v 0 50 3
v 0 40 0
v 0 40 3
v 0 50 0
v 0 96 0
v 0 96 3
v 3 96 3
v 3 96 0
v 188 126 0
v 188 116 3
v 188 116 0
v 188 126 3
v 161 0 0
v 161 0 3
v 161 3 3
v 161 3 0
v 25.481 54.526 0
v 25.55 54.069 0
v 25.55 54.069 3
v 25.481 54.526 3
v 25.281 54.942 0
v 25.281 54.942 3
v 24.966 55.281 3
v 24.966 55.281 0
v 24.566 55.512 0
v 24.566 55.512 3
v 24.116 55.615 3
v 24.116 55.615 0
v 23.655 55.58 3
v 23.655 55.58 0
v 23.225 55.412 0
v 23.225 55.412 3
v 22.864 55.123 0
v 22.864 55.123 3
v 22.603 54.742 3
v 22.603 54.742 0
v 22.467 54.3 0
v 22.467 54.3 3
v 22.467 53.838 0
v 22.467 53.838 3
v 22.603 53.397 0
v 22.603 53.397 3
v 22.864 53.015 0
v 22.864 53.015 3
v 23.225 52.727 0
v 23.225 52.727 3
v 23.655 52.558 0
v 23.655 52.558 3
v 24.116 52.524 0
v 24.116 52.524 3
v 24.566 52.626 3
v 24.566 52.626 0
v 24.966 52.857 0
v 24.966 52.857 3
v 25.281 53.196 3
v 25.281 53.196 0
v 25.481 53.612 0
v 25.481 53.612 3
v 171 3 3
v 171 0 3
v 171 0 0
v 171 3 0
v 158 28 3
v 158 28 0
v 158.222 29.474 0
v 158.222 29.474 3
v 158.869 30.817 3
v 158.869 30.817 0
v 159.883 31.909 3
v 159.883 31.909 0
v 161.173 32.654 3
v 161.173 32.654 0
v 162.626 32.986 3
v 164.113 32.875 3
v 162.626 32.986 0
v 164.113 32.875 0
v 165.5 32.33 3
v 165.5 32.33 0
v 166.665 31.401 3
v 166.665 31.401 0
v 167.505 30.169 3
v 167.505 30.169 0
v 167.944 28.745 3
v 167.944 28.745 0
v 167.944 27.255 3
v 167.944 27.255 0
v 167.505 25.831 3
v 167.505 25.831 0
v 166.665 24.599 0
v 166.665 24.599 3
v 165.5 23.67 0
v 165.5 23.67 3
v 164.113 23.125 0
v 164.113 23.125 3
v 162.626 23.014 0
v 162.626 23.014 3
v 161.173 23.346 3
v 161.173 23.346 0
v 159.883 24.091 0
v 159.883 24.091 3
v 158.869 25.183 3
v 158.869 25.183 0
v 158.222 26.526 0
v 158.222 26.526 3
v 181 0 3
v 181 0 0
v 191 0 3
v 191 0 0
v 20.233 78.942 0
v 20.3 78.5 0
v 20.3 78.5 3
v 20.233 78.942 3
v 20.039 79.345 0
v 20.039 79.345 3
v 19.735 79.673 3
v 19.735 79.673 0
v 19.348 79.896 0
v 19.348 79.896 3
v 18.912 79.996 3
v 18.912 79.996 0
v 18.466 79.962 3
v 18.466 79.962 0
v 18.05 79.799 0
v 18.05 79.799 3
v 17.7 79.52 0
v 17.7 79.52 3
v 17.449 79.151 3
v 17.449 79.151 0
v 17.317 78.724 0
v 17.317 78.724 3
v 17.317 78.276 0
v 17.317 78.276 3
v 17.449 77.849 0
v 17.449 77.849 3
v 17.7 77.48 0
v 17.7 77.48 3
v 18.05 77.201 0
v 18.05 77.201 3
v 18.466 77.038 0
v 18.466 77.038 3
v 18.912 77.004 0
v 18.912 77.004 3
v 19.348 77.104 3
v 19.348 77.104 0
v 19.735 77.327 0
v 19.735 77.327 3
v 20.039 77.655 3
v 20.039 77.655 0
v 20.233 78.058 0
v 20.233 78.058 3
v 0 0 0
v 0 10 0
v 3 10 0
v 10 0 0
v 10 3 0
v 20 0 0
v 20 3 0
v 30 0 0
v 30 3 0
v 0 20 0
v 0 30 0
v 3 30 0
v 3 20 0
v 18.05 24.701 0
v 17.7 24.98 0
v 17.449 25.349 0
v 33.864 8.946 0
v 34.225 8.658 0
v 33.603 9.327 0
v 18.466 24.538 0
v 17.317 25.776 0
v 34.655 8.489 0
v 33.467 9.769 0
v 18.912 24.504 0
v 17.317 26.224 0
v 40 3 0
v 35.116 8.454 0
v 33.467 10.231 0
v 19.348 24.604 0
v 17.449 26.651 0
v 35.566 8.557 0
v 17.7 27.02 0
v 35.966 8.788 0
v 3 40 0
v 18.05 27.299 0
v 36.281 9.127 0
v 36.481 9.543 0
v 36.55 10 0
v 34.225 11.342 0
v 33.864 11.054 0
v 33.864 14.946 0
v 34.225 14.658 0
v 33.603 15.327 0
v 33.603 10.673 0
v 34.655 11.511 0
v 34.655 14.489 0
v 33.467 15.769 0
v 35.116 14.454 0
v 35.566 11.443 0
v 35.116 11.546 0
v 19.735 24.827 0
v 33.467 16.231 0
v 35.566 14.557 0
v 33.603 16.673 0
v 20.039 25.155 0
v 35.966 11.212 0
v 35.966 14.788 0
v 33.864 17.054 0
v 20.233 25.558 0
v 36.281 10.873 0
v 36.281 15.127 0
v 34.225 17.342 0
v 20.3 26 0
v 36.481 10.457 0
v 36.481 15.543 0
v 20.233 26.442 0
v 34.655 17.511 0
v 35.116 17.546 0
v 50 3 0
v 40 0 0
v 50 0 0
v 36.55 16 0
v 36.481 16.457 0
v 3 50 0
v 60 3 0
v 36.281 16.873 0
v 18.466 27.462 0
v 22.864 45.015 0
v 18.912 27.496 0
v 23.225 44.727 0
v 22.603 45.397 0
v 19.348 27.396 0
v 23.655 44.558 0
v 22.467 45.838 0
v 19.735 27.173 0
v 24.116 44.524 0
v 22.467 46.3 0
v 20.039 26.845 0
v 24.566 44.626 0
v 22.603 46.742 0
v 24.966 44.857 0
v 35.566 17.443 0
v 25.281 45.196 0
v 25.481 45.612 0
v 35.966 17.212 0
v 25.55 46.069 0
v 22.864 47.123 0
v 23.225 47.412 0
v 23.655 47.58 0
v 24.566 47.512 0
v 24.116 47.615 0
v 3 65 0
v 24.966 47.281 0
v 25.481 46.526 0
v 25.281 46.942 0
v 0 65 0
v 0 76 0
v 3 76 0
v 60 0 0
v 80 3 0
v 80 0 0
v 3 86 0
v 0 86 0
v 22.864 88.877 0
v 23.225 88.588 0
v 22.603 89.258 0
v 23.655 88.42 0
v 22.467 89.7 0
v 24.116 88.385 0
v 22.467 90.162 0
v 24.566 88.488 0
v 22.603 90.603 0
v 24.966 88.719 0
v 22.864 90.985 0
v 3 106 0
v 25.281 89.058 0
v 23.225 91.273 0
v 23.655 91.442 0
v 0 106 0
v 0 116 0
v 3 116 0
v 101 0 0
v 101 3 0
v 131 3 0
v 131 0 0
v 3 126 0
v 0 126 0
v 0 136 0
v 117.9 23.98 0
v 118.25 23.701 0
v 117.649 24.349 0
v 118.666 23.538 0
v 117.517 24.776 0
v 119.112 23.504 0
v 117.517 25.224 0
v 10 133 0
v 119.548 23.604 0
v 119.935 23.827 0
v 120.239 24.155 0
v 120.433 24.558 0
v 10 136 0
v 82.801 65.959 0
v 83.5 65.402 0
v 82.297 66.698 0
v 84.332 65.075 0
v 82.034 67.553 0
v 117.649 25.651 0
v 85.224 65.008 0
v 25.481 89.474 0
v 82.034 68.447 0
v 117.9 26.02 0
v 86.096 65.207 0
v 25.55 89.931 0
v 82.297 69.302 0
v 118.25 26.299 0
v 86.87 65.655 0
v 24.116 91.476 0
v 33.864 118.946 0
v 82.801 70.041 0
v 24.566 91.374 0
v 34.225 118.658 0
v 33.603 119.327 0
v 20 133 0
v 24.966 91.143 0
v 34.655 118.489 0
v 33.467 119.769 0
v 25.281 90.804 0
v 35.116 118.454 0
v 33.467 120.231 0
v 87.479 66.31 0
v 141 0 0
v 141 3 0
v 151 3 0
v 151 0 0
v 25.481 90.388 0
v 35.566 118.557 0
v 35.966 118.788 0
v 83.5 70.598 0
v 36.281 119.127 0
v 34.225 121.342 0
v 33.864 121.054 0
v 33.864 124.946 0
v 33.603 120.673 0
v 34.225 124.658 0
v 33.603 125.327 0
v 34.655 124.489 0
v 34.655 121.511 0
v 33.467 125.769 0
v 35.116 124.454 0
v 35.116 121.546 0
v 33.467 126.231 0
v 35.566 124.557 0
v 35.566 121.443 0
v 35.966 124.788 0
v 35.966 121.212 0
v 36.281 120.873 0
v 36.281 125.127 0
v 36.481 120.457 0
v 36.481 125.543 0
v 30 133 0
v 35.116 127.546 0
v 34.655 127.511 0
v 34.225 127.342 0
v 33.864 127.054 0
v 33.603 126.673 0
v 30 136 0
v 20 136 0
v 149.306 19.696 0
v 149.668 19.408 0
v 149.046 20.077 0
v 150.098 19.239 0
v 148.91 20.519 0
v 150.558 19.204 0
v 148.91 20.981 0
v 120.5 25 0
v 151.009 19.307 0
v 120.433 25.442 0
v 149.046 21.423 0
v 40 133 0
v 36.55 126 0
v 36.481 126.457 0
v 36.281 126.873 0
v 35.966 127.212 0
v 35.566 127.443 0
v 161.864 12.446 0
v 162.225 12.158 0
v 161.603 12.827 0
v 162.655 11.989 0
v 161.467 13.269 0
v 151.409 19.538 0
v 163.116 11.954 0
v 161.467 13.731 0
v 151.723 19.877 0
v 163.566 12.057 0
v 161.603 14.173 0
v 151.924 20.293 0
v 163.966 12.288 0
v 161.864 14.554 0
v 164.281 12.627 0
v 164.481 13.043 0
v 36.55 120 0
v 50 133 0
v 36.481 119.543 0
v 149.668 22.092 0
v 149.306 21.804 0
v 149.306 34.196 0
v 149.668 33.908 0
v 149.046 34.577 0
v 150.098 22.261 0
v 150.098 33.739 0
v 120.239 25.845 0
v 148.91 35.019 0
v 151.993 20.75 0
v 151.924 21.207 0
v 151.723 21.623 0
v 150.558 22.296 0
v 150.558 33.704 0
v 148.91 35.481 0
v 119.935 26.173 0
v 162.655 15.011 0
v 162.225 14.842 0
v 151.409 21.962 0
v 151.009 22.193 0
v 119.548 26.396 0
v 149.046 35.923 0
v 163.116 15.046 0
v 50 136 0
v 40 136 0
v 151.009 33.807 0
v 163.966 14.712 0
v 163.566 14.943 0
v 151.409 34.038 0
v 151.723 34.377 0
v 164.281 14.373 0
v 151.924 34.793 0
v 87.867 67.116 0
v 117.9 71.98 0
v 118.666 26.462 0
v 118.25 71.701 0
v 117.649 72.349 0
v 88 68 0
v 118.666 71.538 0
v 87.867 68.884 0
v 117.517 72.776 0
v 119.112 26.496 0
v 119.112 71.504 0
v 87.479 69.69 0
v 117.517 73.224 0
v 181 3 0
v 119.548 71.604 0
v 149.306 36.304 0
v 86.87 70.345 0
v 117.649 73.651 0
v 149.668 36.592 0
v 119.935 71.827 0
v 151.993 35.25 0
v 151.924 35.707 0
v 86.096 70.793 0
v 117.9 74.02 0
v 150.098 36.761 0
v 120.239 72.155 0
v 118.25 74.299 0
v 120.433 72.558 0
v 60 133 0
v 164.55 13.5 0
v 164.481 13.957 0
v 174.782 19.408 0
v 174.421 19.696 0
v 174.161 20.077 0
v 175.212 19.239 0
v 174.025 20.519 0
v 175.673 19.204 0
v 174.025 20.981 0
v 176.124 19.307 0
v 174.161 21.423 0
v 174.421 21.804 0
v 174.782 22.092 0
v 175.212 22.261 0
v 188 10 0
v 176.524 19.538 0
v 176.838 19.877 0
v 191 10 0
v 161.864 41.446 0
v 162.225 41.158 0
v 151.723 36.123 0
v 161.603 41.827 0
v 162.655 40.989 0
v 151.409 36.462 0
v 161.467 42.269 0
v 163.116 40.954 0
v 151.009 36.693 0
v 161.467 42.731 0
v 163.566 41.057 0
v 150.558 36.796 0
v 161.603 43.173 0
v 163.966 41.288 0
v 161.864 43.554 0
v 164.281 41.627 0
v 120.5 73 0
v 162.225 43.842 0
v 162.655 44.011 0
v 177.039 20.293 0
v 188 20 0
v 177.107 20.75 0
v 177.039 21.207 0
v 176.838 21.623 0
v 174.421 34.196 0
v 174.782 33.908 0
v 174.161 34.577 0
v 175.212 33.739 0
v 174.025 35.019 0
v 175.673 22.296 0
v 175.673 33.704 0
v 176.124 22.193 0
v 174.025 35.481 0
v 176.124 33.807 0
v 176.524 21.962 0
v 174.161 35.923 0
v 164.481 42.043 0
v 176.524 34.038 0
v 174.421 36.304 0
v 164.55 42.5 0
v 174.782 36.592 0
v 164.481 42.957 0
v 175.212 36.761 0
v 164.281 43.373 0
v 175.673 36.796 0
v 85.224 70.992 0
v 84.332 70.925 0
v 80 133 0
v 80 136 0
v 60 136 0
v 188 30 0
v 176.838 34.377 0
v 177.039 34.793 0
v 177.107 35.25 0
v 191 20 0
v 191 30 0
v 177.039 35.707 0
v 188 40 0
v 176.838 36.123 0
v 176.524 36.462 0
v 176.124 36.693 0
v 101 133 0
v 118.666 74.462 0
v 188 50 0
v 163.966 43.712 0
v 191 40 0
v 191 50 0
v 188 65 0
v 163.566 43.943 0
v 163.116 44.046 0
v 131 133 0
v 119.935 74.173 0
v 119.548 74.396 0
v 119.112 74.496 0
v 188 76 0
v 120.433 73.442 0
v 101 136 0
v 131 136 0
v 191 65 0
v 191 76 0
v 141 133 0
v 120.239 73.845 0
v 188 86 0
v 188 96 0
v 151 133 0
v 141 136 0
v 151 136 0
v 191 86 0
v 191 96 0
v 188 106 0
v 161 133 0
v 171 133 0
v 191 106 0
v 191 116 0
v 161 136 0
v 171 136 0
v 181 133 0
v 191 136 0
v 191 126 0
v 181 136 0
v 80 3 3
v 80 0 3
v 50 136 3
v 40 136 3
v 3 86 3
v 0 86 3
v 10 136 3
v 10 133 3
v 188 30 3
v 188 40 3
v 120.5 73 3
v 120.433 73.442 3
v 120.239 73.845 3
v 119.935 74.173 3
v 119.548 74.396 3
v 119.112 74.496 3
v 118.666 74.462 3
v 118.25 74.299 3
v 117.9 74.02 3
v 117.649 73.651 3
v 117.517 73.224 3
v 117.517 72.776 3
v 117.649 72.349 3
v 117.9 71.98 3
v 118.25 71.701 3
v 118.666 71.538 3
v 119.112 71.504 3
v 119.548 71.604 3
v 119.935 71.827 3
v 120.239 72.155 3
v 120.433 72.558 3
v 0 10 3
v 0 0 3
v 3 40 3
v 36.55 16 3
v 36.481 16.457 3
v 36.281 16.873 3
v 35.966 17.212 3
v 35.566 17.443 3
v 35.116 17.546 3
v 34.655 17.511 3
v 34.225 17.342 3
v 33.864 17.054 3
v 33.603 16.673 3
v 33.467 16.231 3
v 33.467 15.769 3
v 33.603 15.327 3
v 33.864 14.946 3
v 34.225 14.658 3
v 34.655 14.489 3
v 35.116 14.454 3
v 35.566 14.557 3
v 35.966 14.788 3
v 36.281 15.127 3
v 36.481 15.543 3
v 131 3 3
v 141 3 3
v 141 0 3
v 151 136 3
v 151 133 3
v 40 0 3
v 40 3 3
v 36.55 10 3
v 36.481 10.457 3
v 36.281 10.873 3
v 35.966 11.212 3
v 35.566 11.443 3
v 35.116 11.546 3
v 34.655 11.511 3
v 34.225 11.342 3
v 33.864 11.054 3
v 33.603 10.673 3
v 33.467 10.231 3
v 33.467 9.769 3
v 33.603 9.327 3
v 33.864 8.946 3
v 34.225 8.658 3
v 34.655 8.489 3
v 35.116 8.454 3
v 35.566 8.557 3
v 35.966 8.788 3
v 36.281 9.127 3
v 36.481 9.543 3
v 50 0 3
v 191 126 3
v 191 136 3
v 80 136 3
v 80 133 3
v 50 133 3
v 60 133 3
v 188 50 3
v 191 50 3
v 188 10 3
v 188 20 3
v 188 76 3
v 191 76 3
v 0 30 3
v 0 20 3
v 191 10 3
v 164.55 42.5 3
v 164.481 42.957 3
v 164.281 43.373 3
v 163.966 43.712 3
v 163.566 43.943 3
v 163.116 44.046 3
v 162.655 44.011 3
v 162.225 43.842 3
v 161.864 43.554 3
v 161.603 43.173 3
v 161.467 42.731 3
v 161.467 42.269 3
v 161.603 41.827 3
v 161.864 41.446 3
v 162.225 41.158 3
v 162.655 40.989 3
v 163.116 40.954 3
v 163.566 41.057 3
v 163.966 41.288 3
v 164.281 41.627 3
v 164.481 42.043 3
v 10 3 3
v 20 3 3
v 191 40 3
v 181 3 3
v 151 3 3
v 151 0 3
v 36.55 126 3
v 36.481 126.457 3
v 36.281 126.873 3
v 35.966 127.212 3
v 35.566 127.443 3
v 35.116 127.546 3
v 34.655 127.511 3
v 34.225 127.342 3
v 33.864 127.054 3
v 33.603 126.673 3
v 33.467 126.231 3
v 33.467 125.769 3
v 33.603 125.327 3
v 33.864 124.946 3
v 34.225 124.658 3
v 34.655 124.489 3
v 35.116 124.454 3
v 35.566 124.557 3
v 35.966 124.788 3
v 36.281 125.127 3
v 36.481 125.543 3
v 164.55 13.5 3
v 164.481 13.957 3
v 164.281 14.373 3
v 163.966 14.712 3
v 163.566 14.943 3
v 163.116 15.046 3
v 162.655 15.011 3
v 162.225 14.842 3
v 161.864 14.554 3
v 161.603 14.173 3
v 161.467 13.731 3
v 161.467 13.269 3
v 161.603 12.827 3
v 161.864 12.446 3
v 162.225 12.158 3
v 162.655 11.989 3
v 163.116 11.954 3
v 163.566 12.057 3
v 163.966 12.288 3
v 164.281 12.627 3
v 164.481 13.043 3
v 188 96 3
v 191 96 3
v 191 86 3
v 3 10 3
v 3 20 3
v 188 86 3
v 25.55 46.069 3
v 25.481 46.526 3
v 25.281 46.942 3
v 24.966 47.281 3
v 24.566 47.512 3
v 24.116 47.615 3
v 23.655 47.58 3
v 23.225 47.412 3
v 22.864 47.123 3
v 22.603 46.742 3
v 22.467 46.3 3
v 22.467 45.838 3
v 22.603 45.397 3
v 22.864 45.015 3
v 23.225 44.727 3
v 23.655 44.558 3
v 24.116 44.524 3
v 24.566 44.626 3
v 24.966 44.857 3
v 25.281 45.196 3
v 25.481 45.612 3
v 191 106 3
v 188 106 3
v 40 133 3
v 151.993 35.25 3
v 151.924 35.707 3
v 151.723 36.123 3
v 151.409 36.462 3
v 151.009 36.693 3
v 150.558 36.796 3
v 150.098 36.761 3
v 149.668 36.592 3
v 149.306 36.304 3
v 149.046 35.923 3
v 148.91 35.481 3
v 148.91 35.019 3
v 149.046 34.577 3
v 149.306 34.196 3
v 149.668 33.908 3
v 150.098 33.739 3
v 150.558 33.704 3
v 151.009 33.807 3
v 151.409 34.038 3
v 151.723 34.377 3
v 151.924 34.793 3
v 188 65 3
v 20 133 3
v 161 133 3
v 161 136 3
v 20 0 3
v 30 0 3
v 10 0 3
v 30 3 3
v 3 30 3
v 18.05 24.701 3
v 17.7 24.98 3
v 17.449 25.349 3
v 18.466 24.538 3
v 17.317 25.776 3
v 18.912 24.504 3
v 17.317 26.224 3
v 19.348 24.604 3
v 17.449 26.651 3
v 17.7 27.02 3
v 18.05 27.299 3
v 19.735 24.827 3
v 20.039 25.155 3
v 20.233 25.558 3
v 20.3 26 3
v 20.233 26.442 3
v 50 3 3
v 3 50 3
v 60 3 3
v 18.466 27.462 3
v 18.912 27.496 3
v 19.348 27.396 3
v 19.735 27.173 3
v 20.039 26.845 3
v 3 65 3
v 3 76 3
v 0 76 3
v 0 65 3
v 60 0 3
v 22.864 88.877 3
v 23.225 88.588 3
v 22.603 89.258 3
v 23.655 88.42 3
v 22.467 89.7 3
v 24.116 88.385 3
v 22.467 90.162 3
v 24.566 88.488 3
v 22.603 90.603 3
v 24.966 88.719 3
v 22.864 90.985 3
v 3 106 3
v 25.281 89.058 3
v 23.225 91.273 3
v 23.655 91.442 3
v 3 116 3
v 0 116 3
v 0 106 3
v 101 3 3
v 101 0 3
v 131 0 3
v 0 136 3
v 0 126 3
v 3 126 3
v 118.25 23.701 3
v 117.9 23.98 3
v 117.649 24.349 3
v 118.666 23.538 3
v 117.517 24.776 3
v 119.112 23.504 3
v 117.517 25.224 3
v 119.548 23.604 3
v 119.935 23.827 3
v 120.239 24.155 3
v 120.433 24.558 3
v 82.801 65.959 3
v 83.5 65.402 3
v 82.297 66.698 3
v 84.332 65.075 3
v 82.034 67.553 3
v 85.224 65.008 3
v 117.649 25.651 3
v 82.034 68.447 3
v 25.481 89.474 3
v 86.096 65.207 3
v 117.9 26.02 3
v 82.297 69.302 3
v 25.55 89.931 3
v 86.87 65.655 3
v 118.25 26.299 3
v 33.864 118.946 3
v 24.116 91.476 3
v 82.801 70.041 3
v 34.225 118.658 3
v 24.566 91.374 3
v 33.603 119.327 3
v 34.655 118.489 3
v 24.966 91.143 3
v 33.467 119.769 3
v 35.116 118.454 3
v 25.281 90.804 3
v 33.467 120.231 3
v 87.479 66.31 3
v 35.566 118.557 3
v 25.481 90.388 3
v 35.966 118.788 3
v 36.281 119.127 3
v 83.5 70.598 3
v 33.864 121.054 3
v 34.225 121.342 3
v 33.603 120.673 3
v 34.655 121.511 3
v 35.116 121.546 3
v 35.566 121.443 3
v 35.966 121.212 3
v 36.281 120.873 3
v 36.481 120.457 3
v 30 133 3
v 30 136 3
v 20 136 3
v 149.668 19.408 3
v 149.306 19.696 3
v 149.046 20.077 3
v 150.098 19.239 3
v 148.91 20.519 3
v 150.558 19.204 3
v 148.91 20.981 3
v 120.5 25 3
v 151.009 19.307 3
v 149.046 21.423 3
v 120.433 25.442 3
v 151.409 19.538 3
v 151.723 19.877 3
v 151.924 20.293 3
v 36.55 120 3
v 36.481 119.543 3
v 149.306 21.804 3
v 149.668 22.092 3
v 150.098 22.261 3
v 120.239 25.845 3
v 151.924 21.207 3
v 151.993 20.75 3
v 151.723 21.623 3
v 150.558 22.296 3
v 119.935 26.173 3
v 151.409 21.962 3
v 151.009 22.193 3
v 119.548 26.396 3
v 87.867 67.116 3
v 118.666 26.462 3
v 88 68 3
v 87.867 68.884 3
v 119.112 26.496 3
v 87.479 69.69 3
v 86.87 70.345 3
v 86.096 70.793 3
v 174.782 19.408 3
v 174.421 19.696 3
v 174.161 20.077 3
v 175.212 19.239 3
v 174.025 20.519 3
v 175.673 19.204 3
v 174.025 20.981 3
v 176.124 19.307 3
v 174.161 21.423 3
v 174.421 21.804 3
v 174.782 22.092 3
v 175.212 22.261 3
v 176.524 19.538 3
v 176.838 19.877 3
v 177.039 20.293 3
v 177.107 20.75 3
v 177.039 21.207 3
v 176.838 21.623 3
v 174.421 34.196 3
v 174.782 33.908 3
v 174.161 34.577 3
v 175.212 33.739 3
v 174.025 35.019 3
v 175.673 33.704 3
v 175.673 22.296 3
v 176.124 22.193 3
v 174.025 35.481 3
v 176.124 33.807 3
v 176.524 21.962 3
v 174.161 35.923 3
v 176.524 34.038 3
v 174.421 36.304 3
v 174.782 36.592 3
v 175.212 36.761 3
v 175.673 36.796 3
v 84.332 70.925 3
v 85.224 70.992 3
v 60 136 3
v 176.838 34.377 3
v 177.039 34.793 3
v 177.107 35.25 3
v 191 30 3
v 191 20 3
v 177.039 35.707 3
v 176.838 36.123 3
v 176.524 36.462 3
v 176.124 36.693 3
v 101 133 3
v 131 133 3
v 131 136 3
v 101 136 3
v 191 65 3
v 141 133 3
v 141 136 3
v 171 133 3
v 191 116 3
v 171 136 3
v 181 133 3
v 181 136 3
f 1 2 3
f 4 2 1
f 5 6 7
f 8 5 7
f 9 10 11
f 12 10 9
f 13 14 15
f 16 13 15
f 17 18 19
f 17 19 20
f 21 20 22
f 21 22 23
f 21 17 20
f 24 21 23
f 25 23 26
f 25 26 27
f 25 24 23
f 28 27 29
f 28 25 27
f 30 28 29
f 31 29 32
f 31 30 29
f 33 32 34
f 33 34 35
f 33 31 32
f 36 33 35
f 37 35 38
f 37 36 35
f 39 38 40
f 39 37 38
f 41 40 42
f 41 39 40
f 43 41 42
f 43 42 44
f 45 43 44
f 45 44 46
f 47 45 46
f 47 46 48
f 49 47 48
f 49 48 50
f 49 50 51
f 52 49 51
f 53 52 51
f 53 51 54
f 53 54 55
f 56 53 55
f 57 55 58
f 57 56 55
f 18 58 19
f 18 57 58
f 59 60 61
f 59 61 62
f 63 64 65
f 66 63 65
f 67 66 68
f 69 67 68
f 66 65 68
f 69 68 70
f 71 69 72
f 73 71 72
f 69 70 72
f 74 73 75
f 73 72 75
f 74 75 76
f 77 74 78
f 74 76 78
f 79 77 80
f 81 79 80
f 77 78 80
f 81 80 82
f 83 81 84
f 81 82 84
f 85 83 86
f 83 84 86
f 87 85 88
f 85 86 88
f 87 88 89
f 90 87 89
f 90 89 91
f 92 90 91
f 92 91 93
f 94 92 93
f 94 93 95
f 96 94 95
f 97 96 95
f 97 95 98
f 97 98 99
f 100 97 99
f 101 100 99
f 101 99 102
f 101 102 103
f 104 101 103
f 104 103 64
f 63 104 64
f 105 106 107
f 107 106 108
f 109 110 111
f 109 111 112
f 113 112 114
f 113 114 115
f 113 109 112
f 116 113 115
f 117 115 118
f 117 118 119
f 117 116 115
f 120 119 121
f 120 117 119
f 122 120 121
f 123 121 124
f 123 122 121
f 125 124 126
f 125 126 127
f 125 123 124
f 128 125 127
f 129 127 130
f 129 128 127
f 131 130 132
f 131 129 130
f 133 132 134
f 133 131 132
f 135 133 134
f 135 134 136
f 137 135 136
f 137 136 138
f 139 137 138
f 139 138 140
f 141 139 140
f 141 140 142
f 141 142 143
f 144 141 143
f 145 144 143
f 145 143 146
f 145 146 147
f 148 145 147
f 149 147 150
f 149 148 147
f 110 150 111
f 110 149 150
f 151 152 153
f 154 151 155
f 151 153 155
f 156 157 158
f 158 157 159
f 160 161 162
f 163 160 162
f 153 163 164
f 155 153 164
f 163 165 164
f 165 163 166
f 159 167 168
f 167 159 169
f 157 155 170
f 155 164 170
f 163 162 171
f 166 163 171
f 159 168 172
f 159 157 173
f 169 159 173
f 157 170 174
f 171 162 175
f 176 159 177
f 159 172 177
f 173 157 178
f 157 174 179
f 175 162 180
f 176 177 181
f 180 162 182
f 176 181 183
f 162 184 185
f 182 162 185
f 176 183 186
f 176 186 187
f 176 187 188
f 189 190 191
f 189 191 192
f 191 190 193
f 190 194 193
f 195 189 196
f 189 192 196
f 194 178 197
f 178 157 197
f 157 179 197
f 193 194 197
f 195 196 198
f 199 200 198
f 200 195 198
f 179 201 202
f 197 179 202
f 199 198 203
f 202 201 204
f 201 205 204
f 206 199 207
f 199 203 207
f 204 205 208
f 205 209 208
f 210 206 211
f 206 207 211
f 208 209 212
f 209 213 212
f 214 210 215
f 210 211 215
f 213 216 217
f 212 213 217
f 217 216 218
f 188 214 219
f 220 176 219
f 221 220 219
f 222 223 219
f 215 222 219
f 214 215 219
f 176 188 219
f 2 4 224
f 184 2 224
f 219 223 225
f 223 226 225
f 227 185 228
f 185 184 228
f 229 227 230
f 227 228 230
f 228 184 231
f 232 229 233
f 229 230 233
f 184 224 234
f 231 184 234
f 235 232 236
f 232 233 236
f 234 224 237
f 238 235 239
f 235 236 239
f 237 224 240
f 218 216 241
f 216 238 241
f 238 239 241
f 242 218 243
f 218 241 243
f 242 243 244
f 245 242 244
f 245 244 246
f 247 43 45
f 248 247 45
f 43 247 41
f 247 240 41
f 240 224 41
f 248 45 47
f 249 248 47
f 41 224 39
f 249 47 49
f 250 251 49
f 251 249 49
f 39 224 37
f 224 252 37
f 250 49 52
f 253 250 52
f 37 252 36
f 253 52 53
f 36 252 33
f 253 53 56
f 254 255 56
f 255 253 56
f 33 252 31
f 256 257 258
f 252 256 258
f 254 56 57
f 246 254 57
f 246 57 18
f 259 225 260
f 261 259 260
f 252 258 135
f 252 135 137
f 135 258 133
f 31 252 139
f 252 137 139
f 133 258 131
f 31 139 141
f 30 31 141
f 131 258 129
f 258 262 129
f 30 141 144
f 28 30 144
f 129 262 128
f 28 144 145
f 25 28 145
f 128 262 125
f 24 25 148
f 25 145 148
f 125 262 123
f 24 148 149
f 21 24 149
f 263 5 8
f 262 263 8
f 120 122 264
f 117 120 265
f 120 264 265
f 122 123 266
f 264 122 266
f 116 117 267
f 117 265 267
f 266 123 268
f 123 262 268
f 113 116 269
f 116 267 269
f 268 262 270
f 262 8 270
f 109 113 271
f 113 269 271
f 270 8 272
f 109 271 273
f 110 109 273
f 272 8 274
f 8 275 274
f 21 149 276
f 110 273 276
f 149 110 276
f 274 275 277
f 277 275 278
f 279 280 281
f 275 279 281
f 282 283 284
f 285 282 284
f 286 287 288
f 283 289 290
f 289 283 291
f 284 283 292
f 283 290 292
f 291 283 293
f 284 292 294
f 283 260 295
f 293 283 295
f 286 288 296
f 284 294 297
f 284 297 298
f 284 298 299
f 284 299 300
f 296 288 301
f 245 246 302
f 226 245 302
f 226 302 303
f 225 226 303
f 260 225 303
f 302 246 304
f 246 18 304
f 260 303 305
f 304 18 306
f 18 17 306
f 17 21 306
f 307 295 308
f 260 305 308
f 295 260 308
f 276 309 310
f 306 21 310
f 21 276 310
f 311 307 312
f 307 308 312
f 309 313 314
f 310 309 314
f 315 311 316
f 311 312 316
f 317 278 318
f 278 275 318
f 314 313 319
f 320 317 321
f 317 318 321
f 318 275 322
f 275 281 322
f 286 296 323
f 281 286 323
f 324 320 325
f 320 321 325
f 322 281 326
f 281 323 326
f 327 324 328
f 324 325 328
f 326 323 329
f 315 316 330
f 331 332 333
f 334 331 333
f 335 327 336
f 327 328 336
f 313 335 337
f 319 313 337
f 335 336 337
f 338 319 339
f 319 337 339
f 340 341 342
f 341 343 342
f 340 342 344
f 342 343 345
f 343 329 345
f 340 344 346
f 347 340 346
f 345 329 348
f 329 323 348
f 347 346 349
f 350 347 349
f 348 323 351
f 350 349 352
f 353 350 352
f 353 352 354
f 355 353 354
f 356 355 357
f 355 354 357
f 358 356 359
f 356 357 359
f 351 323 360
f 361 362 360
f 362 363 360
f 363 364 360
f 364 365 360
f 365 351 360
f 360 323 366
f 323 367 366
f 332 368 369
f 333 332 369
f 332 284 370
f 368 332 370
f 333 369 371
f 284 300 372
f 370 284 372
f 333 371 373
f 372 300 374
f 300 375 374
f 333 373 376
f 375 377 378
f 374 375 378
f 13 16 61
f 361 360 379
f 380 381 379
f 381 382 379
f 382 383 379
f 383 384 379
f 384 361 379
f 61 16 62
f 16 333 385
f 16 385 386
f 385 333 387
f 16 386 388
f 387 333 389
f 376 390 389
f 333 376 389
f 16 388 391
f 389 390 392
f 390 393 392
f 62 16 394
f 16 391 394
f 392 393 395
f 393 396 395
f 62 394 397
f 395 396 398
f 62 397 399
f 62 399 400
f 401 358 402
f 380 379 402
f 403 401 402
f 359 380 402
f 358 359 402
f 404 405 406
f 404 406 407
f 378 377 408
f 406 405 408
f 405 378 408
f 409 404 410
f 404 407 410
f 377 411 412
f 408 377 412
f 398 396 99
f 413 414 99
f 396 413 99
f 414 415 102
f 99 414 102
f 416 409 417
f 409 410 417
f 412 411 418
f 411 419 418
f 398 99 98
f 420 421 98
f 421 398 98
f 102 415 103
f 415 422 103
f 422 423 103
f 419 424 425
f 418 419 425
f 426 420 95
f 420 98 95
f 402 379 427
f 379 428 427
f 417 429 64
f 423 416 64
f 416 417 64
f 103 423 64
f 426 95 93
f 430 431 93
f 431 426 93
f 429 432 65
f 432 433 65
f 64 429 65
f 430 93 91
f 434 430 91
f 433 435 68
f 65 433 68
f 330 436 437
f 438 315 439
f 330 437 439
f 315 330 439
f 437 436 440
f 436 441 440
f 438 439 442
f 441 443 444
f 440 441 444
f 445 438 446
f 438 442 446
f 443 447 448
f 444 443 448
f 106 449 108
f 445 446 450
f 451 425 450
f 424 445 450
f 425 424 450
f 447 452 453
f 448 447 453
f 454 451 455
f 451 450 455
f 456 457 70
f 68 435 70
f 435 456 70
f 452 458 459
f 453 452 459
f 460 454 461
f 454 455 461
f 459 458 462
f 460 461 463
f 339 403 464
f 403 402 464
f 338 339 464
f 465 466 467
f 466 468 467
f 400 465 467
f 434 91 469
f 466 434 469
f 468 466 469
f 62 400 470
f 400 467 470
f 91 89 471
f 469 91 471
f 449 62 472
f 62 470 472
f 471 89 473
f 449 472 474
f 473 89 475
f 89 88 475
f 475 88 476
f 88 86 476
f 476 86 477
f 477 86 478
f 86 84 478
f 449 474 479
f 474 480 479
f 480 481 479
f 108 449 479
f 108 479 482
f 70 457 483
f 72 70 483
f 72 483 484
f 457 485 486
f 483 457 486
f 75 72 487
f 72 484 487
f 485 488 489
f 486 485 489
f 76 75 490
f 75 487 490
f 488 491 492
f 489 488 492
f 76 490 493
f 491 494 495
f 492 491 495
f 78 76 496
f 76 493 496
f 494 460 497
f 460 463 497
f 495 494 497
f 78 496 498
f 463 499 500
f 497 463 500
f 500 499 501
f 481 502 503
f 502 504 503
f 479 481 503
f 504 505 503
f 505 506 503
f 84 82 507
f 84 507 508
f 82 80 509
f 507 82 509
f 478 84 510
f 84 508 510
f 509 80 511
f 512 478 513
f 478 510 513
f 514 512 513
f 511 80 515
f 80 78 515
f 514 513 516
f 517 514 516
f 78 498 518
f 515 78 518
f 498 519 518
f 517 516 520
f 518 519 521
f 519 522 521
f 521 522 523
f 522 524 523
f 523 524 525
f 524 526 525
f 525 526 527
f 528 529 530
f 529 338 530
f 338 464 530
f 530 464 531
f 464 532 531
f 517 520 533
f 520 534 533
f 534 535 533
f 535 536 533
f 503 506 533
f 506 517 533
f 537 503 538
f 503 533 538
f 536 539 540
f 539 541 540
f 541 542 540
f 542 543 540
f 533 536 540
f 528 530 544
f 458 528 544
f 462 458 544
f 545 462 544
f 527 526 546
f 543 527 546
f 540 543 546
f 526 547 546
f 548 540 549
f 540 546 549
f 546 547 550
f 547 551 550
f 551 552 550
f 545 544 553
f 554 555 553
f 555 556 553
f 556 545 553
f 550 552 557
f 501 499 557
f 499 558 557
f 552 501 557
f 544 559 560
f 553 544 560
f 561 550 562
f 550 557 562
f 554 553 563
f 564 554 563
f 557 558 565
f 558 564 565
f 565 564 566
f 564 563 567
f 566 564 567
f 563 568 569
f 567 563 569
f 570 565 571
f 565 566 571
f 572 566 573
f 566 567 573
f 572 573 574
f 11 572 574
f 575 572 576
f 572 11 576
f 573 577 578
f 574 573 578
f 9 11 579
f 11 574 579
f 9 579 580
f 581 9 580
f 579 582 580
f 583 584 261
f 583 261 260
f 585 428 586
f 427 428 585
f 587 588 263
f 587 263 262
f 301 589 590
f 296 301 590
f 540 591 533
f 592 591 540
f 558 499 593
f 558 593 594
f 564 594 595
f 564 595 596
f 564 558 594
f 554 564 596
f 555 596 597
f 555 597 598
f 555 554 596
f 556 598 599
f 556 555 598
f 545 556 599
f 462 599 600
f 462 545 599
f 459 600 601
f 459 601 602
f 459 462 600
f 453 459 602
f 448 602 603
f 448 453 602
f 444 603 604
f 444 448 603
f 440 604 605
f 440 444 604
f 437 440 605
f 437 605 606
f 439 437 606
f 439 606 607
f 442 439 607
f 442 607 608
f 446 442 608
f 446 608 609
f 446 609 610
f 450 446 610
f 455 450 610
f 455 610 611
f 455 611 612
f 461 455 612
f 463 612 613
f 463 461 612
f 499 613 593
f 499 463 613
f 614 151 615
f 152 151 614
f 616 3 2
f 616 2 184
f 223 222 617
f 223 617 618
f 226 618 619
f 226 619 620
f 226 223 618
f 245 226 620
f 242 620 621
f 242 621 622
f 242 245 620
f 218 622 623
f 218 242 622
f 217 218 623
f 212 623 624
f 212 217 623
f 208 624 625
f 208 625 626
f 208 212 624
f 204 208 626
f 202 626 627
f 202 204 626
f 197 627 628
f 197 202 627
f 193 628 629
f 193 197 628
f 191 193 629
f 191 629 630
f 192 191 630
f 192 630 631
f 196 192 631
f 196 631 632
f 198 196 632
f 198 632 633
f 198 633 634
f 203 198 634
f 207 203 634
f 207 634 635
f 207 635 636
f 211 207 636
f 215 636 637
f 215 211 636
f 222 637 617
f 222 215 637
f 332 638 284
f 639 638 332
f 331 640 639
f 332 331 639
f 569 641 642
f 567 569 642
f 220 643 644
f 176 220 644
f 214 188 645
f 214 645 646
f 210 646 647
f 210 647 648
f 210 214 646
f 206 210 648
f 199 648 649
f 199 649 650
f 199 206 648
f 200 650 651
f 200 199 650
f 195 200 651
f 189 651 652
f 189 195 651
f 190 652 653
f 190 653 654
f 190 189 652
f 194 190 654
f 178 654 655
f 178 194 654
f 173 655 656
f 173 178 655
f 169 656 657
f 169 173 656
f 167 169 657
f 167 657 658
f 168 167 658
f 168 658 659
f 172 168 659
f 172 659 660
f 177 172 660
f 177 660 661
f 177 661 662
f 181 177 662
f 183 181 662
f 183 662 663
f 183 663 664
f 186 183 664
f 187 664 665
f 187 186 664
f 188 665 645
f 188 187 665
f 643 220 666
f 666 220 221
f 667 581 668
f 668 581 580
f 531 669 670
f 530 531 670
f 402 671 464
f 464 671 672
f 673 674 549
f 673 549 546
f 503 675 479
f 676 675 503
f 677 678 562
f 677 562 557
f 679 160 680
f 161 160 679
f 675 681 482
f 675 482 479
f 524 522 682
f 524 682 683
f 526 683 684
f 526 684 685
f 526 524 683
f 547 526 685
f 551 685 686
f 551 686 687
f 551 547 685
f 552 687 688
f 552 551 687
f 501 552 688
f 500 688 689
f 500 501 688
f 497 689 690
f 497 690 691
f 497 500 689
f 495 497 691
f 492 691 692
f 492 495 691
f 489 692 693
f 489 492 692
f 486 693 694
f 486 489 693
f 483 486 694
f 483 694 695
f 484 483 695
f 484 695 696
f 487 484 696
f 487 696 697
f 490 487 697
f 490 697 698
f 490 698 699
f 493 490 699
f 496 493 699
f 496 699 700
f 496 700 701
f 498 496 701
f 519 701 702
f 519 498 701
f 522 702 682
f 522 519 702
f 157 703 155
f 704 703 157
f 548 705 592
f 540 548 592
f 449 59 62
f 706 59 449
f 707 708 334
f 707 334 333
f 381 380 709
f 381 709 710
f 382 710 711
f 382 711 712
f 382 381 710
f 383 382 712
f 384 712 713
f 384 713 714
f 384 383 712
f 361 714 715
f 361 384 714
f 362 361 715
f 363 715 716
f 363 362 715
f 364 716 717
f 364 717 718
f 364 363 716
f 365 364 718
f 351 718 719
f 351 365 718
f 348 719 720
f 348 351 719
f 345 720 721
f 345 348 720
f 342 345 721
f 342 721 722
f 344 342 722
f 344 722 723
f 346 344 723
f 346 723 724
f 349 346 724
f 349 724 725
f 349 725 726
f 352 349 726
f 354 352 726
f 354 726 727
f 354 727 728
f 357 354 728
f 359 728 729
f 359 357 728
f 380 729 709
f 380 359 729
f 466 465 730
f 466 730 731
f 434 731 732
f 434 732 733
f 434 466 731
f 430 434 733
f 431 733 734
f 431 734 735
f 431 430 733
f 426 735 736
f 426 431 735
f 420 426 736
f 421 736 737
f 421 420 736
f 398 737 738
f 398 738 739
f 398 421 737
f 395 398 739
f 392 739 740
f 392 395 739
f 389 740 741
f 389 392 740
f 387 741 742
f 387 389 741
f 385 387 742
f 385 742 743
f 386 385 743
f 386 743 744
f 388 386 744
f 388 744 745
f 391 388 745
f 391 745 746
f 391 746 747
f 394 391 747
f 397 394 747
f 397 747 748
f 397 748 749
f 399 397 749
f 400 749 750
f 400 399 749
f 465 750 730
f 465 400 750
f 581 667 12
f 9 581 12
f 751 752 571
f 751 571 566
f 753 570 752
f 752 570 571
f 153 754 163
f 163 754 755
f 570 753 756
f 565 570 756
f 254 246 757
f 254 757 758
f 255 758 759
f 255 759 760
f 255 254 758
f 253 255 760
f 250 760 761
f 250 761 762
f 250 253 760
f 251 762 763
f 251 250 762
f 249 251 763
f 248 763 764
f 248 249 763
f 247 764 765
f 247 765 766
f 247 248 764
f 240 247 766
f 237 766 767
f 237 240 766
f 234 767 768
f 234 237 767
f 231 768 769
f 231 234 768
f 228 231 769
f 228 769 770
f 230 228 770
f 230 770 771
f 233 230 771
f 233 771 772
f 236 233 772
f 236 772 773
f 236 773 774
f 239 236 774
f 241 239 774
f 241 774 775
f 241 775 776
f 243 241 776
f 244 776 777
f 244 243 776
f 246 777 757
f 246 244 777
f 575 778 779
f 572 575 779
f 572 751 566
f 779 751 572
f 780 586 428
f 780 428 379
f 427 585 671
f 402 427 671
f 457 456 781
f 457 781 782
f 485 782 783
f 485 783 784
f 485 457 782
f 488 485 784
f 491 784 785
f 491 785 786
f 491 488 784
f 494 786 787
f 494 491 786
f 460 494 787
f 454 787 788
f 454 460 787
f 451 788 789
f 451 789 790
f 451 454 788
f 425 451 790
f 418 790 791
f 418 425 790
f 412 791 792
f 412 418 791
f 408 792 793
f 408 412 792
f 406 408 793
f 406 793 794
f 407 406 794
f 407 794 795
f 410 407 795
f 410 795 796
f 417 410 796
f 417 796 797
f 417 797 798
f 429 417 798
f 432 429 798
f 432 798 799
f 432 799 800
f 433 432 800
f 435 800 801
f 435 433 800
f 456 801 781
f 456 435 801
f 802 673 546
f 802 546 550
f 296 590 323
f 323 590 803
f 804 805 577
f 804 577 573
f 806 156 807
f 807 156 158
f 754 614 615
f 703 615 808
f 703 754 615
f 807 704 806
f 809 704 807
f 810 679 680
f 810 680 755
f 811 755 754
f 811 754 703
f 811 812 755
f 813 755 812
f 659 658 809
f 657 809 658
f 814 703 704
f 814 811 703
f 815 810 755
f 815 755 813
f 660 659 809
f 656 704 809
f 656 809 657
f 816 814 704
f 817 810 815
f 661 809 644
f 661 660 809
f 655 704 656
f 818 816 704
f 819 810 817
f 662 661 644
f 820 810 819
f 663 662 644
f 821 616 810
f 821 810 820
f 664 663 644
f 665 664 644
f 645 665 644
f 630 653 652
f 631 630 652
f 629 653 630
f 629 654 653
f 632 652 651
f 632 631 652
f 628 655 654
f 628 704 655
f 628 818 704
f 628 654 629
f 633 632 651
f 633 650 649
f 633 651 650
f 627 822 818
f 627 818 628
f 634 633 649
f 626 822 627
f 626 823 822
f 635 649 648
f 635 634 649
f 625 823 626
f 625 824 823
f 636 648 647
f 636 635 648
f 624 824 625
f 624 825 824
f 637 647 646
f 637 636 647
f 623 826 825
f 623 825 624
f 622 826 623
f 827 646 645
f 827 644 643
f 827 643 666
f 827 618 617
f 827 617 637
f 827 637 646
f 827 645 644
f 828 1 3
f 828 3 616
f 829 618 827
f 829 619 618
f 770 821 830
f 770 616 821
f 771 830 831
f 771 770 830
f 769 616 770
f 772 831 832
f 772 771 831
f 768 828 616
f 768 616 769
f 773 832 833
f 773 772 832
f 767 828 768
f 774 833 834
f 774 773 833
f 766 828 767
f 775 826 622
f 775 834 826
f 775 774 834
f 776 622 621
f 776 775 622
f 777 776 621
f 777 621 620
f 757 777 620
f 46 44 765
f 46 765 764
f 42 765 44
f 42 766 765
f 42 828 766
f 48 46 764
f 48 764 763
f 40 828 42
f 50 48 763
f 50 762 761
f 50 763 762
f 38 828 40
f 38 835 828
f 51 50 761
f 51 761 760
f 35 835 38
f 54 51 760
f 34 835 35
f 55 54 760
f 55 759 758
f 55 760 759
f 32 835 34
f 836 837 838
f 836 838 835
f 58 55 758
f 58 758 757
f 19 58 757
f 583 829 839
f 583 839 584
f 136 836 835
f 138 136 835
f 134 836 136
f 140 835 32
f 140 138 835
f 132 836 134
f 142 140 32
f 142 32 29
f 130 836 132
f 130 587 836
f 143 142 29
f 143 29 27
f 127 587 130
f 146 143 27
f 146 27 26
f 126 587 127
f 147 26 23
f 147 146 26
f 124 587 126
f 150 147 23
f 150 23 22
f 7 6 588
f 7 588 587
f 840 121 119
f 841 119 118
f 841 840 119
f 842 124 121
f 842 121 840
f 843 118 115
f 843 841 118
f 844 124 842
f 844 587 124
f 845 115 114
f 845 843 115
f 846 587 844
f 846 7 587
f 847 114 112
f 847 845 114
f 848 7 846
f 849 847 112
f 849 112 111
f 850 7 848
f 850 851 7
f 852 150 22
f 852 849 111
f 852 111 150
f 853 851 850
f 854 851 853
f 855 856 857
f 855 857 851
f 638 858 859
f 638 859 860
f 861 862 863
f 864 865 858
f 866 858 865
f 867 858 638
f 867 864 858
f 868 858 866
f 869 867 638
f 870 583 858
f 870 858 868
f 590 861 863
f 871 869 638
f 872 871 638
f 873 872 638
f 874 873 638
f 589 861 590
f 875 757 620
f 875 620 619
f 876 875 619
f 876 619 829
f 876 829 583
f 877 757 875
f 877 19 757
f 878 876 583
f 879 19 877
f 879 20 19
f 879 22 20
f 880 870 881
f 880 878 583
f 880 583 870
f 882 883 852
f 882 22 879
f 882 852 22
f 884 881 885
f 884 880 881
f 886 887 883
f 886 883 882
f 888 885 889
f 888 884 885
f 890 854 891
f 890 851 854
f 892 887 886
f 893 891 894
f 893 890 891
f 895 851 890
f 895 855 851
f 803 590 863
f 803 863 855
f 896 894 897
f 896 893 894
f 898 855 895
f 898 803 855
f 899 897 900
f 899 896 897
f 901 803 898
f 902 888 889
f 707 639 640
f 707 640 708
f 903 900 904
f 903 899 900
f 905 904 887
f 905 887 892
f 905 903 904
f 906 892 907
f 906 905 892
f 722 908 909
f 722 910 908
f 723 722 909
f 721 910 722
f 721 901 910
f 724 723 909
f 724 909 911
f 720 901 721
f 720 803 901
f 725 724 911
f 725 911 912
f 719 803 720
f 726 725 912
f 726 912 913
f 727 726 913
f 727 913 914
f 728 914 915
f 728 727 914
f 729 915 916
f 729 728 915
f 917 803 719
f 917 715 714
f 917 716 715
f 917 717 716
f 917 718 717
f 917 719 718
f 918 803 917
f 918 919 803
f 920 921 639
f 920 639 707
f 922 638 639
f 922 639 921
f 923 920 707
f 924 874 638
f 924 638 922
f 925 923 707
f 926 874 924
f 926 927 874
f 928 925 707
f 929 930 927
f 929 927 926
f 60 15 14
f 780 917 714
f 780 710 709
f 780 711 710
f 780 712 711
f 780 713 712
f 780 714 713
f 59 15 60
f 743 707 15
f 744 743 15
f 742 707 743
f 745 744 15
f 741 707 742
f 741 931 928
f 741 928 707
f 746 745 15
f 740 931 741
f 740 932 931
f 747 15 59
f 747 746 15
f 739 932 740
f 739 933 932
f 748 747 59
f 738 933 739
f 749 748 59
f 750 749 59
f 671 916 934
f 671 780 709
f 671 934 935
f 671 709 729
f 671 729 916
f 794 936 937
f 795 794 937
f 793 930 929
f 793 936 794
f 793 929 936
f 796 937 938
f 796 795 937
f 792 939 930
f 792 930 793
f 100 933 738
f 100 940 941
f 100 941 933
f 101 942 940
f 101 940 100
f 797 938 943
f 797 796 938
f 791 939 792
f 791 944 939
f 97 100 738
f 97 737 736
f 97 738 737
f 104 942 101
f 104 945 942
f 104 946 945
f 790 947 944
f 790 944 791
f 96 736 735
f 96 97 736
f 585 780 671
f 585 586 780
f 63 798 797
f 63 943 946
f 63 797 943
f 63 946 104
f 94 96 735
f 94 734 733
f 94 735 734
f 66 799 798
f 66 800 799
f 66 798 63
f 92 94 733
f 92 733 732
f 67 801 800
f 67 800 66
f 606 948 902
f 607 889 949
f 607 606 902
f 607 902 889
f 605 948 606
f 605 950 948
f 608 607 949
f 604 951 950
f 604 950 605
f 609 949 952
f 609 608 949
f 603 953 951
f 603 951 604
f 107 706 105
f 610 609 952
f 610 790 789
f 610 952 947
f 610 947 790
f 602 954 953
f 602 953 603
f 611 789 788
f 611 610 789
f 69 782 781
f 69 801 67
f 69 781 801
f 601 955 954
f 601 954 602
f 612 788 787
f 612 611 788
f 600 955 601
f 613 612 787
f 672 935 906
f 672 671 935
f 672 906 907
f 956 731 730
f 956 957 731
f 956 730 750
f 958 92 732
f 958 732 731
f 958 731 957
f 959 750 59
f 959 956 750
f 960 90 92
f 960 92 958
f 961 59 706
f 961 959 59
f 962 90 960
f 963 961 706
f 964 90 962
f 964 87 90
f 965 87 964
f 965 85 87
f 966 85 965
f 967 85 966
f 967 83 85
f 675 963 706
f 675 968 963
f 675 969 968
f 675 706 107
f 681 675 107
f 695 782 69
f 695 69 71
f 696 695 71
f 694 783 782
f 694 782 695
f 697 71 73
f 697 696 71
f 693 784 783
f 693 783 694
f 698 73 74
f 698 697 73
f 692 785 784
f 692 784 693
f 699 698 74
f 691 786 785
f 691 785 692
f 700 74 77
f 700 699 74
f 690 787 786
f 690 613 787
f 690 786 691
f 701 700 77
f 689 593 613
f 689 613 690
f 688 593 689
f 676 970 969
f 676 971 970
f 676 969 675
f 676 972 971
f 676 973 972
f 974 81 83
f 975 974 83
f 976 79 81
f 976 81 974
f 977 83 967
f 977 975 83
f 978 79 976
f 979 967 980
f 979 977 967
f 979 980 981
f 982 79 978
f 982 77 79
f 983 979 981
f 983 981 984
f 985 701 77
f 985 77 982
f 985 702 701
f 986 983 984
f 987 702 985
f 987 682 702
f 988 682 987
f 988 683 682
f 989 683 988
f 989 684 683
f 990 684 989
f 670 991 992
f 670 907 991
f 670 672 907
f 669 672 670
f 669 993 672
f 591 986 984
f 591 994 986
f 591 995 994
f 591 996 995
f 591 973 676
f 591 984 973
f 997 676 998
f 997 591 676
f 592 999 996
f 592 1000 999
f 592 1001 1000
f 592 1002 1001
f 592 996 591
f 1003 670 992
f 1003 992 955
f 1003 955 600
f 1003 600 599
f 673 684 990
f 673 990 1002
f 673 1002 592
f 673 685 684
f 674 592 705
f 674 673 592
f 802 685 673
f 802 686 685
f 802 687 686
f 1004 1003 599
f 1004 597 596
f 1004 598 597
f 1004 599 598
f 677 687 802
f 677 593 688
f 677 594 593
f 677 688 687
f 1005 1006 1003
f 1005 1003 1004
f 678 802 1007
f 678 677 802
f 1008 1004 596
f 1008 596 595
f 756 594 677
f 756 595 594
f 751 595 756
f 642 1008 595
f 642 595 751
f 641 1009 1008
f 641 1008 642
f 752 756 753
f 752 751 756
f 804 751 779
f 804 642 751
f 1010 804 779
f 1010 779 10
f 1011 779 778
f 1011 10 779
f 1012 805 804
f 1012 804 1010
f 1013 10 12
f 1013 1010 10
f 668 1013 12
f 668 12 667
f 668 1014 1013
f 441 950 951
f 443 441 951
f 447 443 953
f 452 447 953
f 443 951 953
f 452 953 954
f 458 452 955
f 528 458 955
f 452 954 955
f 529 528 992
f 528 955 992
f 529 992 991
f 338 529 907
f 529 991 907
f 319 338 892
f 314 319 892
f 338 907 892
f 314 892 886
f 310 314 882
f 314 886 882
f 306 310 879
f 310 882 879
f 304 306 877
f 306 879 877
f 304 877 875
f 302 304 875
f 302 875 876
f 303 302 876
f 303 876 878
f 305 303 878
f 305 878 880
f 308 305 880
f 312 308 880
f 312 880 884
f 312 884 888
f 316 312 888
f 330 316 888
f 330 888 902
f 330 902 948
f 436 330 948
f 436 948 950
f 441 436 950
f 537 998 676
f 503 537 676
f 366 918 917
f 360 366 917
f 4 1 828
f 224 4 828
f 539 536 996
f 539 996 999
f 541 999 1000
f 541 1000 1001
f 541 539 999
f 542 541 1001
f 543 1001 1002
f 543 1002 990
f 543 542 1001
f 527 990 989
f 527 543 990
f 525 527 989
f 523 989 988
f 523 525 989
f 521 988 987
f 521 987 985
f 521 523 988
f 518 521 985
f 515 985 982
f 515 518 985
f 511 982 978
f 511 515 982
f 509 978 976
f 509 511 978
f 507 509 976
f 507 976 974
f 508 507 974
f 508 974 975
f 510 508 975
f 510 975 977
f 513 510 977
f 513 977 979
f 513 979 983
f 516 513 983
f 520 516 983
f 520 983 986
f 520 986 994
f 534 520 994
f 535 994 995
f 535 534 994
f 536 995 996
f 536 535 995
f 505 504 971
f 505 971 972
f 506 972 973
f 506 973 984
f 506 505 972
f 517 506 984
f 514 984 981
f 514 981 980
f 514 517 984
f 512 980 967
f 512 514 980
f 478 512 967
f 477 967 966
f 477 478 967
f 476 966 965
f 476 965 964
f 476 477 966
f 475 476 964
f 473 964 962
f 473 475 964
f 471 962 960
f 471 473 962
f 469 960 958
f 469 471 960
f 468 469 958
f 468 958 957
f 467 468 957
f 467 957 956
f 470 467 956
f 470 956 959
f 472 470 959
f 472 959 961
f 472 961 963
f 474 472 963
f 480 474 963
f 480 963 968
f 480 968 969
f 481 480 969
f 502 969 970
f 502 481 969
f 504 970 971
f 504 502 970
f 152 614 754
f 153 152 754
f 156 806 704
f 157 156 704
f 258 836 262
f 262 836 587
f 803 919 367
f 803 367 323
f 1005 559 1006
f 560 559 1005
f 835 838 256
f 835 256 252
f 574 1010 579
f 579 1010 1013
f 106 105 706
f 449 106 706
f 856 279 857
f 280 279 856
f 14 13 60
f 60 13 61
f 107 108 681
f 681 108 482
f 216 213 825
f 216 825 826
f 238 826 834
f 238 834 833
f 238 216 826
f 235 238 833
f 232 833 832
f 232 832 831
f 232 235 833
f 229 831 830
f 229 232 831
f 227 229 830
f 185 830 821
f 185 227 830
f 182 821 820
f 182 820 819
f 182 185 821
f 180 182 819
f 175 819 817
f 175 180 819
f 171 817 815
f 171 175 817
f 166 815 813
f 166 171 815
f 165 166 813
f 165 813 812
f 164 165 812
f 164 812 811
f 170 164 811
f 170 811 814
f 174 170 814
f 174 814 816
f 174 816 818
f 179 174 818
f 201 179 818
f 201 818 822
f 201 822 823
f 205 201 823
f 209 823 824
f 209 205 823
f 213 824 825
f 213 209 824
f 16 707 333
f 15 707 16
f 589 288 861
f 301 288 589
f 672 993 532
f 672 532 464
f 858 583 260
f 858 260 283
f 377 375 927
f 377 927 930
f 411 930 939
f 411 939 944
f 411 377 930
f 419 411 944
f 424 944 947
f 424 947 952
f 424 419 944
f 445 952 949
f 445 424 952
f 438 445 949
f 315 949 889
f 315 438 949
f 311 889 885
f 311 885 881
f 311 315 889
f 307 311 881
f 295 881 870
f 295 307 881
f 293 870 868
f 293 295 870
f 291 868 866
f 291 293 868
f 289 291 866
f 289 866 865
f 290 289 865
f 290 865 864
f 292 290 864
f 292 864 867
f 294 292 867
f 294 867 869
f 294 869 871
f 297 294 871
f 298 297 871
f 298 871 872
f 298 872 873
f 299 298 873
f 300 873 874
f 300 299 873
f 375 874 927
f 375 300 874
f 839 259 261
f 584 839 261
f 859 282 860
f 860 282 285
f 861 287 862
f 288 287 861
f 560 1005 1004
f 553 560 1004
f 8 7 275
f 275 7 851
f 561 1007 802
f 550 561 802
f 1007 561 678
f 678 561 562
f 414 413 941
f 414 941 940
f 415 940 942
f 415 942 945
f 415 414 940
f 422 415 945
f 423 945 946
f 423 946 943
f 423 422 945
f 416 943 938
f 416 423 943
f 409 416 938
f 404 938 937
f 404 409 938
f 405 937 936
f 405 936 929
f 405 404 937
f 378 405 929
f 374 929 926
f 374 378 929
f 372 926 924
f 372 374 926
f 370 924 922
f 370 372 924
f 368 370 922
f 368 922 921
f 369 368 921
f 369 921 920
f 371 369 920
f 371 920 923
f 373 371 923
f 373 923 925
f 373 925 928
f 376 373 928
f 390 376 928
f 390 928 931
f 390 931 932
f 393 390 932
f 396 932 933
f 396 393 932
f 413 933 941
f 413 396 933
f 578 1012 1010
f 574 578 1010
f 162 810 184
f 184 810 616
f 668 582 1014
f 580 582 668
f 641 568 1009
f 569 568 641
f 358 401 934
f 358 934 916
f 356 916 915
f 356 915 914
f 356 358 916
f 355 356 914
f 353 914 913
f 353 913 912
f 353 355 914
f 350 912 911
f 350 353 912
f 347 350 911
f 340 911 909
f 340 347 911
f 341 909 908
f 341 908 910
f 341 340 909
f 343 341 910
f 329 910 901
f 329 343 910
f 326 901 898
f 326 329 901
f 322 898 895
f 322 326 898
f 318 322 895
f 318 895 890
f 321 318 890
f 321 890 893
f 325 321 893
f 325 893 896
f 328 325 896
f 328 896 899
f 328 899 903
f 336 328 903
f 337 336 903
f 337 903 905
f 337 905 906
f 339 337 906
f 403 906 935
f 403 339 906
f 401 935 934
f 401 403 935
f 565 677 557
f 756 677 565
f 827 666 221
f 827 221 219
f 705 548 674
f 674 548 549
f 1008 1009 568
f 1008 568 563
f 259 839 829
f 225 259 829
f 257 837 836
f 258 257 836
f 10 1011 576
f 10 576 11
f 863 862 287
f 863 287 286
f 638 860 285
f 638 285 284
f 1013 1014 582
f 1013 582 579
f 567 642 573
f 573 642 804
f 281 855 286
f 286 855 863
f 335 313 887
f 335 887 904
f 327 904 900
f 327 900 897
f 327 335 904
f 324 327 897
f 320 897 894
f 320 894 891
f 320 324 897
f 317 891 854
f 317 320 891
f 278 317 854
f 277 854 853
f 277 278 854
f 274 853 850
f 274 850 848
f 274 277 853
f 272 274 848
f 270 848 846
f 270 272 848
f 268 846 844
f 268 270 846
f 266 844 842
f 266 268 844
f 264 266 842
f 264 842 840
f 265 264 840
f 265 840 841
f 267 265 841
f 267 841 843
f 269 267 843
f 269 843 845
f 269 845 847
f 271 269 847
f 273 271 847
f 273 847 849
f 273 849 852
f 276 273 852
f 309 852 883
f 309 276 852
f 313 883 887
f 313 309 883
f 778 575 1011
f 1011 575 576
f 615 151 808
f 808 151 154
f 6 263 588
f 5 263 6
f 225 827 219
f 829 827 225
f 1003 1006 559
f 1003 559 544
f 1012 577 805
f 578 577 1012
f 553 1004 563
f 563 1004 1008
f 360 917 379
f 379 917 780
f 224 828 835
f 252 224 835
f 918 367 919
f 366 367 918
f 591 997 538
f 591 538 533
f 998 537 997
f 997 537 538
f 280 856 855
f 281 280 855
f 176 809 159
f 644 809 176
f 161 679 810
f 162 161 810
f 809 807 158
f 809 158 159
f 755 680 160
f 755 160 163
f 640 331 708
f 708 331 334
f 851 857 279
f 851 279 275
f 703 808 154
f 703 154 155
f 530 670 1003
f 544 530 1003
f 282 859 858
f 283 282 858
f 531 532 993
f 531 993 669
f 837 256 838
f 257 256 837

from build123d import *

# Parameters (mm, degrees)
SKETCH2_W           = 191
SKETCH2_H           = 136
SKETCH2_R           = 1.55
SKETCH2_R_2         = 1.549999948
SKETCH2_R_3         = 1.5
BOSS_EXTRUDE1_DEPTH = 3
SKETCH3_W           = 10
SKETCH3_H           = 3
SKETCH3_W_2         = 21
CUT_EXTRUDE1_DEPTH  = 3
SKETCH4_W           = 3
SKETCH4_H           = 10
SKETCH4_H_2         = 15
CUT_EXTRUDE2_DEPTH  = 3
CUT_EXTRUDE3_REACH  = 5
SKETCH8_R           = 5
CUT_EXTRUDE4_REACH  = 5
SKETCH9_R           = 3


with BuildPart() as part:
    # Sketch2 → Boss-Extrude1 (new body)
    with BuildSketch(Plane.XY):
        with Locations((95.5, 68)):
            Rectangle(SKETCH2_W, SKETCH2_H)
        with Locations((35, 16)):
            Circle(SKETCH2_R, mode=Mode.SUBTRACT)
        with Locations((35, 10)):
            Circle(SKETCH2_R, mode=Mode.SUBTRACT)
        with Locations((24, 46.069195574)):
            Circle(SKETCH2_R, mode=Mode.SUBTRACT)
        with Locations((24, 54.069195574)):
            Circle(SKETCH2_R, mode=Mode.SUBTRACT)
        with Locations((24, 89.930804426)):
            Circle(SKETCH2_R, mode=Mode.SUBTRACT)
        with Locations((35, 120)):
            Circle(SKETCH2_R, mode=Mode.SUBTRACT)
        with Locations((35, 126)):
            Circle(SKETCH2_R, mode=Mode.SUBTRACT)
        with Locations((175.557368355, 35.25)):
            Circle(SKETCH2_R_2, mode=Mode.SUBTRACT)
        with Locations((163, 42.5)):
            Circle(SKETCH2_R_2, mode=Mode.SUBTRACT)
        with Locations((150.442631645, 35.25)):
            Circle(SKETCH2_R_2, mode=Mode.SUBTRACT)
        with Locations((150.442631645, 20.75)):
            Circle(SKETCH2_R_2, mode=Mode.SUBTRACT)
        with Locations((163, 13.5)):
            Circle(SKETCH2_R_2, mode=Mode.SUBTRACT)
        with Locations((175.557368355, 20.75)):
            Circle(SKETCH2_R_2, mode=Mode.SUBTRACT)
        with Locations((18.8, 78.5)):
            Circle(SKETCH2_R_3, mode=Mode.SUBTRACT)
        with Locations((18.8, 26)):
            Circle(SKETCH2_R_3, mode=Mode.SUBTRACT)
        with Locations((119, 73)):
            Circle(SKETCH2_R_3, mode=Mode.SUBTRACT)
        with Locations((119, 25)):
            Circle(SKETCH2_R_3, mode=Mode.SUBTRACT)
    extrude(amount=BOSS_EXTRUDE1_DEPTH)

    # Sketch3 → Cut-Extrude1 (cut)
    with BuildSketch(Plane.XY.offset(3)):
        with Locations((15, 1.5)):
            Rectangle(SKETCH3_W, SKETCH3_H)
        with Locations((35, 1.5)):
            Rectangle(SKETCH3_W, SKETCH3_H)
        with Locations((55, 1.5)):
            Rectangle(SKETCH3_W, SKETCH3_H)
        with Locations((90.5, 1.5)):
            Rectangle(SKETCH3_W_2, SKETCH3_H)
        with Locations((176, 1.5)):
            Rectangle(SKETCH3_W, SKETCH3_H)
        with Locations((156, 1.5)):
            Rectangle(SKETCH3_W, SKETCH3_H)
        with Locations((136, 1.5)):
            Rectangle(SKETCH3_W, SKETCH3_H)
    cut_extrude1 = extrude(amount=-CUT_EXTRUDE1_DEPTH, mode=Mode.SUBTRACT)

    # Mirror1: Cut-Extrude1 across plane
    add(cut_extrude1.mirror(Plane.ZX.offset(68)), mode=Mode.SUBTRACT)

    # Sketch4 → Cut-Extrude2 (cut)
    with BuildSketch(Plane.XY.offset(3)):
        with Locations((1.5, 121)):
            Rectangle(SKETCH4_W, SKETCH4_H)
        with Locations((1.5, 101)):
            Rectangle(SKETCH4_W, SKETCH4_H)
        with Locations((1.5, 81)):
            Rectangle(SKETCH4_W, SKETCH4_H)
        with Locations((1.5, 15)):
            Rectangle(SKETCH4_W, SKETCH4_H)
        with Locations((1.5, 35)):
            Rectangle(SKETCH4_W, SKETCH4_H)
        with Locations((1.5, 57.5)):
            Rectangle(SKETCH4_W, SKETCH4_H_2)
    cut_extrude2 = extrude(amount=-CUT_EXTRUDE2_DEPTH, mode=Mode.SUBTRACT)

    # Mirror2: Cut-Extrude2 across plane
    add(cut_extrude2.mirror(Plane(origin=(95.5, 0, 0), x_dir=(0, 0, 1), z_dir=(1, 0, 0))), mode=Mode.SUBTRACT)

    # Sketch8 → Cut-Extrude3 (cut, up to next)
    with BuildSketch(Plane(origin=(0, 0, 0), x_dir=(-1, 0, 0), z_dir=(0, 0, -1)), mode=Mode.PRIVATE) as cut_extrude3_sk1:
        with Locations((-163, 28)):
            Circle(SKETCH8_R)
    cut_extrude3_tool1 = extrude(cut_extrude3_sk1.sketch, amount=-CUT_EXTRUDE3_REACH, mode=Mode.PRIVATE) & part.part
    add(cut_extrude3_tool1.solids().sort_by_distance((163, 28, 0))[0], mode=Mode.SUBTRACT)

    # Sketch9 → Cut-Extrude4 (cut, up to next)
    with BuildSketch(Plane.XY.offset(3), mode=Mode.PRIVATE) as cut_extrude4_sk1:
        with Locations((85, 68)):
            Circle(SKETCH9_R)
    cut_extrude4_tool1 = extrude(cut_extrude4_sk1.sketch, amount=-CUT_EXTRUDE4_REACH, mode=Mode.PRIVATE) & part.part
    add(cut_extrude4_tool1.solids().sort_by_distance((85, 68, 3))[0], mode=Mode.SUBTRACT)


solid = part.part
